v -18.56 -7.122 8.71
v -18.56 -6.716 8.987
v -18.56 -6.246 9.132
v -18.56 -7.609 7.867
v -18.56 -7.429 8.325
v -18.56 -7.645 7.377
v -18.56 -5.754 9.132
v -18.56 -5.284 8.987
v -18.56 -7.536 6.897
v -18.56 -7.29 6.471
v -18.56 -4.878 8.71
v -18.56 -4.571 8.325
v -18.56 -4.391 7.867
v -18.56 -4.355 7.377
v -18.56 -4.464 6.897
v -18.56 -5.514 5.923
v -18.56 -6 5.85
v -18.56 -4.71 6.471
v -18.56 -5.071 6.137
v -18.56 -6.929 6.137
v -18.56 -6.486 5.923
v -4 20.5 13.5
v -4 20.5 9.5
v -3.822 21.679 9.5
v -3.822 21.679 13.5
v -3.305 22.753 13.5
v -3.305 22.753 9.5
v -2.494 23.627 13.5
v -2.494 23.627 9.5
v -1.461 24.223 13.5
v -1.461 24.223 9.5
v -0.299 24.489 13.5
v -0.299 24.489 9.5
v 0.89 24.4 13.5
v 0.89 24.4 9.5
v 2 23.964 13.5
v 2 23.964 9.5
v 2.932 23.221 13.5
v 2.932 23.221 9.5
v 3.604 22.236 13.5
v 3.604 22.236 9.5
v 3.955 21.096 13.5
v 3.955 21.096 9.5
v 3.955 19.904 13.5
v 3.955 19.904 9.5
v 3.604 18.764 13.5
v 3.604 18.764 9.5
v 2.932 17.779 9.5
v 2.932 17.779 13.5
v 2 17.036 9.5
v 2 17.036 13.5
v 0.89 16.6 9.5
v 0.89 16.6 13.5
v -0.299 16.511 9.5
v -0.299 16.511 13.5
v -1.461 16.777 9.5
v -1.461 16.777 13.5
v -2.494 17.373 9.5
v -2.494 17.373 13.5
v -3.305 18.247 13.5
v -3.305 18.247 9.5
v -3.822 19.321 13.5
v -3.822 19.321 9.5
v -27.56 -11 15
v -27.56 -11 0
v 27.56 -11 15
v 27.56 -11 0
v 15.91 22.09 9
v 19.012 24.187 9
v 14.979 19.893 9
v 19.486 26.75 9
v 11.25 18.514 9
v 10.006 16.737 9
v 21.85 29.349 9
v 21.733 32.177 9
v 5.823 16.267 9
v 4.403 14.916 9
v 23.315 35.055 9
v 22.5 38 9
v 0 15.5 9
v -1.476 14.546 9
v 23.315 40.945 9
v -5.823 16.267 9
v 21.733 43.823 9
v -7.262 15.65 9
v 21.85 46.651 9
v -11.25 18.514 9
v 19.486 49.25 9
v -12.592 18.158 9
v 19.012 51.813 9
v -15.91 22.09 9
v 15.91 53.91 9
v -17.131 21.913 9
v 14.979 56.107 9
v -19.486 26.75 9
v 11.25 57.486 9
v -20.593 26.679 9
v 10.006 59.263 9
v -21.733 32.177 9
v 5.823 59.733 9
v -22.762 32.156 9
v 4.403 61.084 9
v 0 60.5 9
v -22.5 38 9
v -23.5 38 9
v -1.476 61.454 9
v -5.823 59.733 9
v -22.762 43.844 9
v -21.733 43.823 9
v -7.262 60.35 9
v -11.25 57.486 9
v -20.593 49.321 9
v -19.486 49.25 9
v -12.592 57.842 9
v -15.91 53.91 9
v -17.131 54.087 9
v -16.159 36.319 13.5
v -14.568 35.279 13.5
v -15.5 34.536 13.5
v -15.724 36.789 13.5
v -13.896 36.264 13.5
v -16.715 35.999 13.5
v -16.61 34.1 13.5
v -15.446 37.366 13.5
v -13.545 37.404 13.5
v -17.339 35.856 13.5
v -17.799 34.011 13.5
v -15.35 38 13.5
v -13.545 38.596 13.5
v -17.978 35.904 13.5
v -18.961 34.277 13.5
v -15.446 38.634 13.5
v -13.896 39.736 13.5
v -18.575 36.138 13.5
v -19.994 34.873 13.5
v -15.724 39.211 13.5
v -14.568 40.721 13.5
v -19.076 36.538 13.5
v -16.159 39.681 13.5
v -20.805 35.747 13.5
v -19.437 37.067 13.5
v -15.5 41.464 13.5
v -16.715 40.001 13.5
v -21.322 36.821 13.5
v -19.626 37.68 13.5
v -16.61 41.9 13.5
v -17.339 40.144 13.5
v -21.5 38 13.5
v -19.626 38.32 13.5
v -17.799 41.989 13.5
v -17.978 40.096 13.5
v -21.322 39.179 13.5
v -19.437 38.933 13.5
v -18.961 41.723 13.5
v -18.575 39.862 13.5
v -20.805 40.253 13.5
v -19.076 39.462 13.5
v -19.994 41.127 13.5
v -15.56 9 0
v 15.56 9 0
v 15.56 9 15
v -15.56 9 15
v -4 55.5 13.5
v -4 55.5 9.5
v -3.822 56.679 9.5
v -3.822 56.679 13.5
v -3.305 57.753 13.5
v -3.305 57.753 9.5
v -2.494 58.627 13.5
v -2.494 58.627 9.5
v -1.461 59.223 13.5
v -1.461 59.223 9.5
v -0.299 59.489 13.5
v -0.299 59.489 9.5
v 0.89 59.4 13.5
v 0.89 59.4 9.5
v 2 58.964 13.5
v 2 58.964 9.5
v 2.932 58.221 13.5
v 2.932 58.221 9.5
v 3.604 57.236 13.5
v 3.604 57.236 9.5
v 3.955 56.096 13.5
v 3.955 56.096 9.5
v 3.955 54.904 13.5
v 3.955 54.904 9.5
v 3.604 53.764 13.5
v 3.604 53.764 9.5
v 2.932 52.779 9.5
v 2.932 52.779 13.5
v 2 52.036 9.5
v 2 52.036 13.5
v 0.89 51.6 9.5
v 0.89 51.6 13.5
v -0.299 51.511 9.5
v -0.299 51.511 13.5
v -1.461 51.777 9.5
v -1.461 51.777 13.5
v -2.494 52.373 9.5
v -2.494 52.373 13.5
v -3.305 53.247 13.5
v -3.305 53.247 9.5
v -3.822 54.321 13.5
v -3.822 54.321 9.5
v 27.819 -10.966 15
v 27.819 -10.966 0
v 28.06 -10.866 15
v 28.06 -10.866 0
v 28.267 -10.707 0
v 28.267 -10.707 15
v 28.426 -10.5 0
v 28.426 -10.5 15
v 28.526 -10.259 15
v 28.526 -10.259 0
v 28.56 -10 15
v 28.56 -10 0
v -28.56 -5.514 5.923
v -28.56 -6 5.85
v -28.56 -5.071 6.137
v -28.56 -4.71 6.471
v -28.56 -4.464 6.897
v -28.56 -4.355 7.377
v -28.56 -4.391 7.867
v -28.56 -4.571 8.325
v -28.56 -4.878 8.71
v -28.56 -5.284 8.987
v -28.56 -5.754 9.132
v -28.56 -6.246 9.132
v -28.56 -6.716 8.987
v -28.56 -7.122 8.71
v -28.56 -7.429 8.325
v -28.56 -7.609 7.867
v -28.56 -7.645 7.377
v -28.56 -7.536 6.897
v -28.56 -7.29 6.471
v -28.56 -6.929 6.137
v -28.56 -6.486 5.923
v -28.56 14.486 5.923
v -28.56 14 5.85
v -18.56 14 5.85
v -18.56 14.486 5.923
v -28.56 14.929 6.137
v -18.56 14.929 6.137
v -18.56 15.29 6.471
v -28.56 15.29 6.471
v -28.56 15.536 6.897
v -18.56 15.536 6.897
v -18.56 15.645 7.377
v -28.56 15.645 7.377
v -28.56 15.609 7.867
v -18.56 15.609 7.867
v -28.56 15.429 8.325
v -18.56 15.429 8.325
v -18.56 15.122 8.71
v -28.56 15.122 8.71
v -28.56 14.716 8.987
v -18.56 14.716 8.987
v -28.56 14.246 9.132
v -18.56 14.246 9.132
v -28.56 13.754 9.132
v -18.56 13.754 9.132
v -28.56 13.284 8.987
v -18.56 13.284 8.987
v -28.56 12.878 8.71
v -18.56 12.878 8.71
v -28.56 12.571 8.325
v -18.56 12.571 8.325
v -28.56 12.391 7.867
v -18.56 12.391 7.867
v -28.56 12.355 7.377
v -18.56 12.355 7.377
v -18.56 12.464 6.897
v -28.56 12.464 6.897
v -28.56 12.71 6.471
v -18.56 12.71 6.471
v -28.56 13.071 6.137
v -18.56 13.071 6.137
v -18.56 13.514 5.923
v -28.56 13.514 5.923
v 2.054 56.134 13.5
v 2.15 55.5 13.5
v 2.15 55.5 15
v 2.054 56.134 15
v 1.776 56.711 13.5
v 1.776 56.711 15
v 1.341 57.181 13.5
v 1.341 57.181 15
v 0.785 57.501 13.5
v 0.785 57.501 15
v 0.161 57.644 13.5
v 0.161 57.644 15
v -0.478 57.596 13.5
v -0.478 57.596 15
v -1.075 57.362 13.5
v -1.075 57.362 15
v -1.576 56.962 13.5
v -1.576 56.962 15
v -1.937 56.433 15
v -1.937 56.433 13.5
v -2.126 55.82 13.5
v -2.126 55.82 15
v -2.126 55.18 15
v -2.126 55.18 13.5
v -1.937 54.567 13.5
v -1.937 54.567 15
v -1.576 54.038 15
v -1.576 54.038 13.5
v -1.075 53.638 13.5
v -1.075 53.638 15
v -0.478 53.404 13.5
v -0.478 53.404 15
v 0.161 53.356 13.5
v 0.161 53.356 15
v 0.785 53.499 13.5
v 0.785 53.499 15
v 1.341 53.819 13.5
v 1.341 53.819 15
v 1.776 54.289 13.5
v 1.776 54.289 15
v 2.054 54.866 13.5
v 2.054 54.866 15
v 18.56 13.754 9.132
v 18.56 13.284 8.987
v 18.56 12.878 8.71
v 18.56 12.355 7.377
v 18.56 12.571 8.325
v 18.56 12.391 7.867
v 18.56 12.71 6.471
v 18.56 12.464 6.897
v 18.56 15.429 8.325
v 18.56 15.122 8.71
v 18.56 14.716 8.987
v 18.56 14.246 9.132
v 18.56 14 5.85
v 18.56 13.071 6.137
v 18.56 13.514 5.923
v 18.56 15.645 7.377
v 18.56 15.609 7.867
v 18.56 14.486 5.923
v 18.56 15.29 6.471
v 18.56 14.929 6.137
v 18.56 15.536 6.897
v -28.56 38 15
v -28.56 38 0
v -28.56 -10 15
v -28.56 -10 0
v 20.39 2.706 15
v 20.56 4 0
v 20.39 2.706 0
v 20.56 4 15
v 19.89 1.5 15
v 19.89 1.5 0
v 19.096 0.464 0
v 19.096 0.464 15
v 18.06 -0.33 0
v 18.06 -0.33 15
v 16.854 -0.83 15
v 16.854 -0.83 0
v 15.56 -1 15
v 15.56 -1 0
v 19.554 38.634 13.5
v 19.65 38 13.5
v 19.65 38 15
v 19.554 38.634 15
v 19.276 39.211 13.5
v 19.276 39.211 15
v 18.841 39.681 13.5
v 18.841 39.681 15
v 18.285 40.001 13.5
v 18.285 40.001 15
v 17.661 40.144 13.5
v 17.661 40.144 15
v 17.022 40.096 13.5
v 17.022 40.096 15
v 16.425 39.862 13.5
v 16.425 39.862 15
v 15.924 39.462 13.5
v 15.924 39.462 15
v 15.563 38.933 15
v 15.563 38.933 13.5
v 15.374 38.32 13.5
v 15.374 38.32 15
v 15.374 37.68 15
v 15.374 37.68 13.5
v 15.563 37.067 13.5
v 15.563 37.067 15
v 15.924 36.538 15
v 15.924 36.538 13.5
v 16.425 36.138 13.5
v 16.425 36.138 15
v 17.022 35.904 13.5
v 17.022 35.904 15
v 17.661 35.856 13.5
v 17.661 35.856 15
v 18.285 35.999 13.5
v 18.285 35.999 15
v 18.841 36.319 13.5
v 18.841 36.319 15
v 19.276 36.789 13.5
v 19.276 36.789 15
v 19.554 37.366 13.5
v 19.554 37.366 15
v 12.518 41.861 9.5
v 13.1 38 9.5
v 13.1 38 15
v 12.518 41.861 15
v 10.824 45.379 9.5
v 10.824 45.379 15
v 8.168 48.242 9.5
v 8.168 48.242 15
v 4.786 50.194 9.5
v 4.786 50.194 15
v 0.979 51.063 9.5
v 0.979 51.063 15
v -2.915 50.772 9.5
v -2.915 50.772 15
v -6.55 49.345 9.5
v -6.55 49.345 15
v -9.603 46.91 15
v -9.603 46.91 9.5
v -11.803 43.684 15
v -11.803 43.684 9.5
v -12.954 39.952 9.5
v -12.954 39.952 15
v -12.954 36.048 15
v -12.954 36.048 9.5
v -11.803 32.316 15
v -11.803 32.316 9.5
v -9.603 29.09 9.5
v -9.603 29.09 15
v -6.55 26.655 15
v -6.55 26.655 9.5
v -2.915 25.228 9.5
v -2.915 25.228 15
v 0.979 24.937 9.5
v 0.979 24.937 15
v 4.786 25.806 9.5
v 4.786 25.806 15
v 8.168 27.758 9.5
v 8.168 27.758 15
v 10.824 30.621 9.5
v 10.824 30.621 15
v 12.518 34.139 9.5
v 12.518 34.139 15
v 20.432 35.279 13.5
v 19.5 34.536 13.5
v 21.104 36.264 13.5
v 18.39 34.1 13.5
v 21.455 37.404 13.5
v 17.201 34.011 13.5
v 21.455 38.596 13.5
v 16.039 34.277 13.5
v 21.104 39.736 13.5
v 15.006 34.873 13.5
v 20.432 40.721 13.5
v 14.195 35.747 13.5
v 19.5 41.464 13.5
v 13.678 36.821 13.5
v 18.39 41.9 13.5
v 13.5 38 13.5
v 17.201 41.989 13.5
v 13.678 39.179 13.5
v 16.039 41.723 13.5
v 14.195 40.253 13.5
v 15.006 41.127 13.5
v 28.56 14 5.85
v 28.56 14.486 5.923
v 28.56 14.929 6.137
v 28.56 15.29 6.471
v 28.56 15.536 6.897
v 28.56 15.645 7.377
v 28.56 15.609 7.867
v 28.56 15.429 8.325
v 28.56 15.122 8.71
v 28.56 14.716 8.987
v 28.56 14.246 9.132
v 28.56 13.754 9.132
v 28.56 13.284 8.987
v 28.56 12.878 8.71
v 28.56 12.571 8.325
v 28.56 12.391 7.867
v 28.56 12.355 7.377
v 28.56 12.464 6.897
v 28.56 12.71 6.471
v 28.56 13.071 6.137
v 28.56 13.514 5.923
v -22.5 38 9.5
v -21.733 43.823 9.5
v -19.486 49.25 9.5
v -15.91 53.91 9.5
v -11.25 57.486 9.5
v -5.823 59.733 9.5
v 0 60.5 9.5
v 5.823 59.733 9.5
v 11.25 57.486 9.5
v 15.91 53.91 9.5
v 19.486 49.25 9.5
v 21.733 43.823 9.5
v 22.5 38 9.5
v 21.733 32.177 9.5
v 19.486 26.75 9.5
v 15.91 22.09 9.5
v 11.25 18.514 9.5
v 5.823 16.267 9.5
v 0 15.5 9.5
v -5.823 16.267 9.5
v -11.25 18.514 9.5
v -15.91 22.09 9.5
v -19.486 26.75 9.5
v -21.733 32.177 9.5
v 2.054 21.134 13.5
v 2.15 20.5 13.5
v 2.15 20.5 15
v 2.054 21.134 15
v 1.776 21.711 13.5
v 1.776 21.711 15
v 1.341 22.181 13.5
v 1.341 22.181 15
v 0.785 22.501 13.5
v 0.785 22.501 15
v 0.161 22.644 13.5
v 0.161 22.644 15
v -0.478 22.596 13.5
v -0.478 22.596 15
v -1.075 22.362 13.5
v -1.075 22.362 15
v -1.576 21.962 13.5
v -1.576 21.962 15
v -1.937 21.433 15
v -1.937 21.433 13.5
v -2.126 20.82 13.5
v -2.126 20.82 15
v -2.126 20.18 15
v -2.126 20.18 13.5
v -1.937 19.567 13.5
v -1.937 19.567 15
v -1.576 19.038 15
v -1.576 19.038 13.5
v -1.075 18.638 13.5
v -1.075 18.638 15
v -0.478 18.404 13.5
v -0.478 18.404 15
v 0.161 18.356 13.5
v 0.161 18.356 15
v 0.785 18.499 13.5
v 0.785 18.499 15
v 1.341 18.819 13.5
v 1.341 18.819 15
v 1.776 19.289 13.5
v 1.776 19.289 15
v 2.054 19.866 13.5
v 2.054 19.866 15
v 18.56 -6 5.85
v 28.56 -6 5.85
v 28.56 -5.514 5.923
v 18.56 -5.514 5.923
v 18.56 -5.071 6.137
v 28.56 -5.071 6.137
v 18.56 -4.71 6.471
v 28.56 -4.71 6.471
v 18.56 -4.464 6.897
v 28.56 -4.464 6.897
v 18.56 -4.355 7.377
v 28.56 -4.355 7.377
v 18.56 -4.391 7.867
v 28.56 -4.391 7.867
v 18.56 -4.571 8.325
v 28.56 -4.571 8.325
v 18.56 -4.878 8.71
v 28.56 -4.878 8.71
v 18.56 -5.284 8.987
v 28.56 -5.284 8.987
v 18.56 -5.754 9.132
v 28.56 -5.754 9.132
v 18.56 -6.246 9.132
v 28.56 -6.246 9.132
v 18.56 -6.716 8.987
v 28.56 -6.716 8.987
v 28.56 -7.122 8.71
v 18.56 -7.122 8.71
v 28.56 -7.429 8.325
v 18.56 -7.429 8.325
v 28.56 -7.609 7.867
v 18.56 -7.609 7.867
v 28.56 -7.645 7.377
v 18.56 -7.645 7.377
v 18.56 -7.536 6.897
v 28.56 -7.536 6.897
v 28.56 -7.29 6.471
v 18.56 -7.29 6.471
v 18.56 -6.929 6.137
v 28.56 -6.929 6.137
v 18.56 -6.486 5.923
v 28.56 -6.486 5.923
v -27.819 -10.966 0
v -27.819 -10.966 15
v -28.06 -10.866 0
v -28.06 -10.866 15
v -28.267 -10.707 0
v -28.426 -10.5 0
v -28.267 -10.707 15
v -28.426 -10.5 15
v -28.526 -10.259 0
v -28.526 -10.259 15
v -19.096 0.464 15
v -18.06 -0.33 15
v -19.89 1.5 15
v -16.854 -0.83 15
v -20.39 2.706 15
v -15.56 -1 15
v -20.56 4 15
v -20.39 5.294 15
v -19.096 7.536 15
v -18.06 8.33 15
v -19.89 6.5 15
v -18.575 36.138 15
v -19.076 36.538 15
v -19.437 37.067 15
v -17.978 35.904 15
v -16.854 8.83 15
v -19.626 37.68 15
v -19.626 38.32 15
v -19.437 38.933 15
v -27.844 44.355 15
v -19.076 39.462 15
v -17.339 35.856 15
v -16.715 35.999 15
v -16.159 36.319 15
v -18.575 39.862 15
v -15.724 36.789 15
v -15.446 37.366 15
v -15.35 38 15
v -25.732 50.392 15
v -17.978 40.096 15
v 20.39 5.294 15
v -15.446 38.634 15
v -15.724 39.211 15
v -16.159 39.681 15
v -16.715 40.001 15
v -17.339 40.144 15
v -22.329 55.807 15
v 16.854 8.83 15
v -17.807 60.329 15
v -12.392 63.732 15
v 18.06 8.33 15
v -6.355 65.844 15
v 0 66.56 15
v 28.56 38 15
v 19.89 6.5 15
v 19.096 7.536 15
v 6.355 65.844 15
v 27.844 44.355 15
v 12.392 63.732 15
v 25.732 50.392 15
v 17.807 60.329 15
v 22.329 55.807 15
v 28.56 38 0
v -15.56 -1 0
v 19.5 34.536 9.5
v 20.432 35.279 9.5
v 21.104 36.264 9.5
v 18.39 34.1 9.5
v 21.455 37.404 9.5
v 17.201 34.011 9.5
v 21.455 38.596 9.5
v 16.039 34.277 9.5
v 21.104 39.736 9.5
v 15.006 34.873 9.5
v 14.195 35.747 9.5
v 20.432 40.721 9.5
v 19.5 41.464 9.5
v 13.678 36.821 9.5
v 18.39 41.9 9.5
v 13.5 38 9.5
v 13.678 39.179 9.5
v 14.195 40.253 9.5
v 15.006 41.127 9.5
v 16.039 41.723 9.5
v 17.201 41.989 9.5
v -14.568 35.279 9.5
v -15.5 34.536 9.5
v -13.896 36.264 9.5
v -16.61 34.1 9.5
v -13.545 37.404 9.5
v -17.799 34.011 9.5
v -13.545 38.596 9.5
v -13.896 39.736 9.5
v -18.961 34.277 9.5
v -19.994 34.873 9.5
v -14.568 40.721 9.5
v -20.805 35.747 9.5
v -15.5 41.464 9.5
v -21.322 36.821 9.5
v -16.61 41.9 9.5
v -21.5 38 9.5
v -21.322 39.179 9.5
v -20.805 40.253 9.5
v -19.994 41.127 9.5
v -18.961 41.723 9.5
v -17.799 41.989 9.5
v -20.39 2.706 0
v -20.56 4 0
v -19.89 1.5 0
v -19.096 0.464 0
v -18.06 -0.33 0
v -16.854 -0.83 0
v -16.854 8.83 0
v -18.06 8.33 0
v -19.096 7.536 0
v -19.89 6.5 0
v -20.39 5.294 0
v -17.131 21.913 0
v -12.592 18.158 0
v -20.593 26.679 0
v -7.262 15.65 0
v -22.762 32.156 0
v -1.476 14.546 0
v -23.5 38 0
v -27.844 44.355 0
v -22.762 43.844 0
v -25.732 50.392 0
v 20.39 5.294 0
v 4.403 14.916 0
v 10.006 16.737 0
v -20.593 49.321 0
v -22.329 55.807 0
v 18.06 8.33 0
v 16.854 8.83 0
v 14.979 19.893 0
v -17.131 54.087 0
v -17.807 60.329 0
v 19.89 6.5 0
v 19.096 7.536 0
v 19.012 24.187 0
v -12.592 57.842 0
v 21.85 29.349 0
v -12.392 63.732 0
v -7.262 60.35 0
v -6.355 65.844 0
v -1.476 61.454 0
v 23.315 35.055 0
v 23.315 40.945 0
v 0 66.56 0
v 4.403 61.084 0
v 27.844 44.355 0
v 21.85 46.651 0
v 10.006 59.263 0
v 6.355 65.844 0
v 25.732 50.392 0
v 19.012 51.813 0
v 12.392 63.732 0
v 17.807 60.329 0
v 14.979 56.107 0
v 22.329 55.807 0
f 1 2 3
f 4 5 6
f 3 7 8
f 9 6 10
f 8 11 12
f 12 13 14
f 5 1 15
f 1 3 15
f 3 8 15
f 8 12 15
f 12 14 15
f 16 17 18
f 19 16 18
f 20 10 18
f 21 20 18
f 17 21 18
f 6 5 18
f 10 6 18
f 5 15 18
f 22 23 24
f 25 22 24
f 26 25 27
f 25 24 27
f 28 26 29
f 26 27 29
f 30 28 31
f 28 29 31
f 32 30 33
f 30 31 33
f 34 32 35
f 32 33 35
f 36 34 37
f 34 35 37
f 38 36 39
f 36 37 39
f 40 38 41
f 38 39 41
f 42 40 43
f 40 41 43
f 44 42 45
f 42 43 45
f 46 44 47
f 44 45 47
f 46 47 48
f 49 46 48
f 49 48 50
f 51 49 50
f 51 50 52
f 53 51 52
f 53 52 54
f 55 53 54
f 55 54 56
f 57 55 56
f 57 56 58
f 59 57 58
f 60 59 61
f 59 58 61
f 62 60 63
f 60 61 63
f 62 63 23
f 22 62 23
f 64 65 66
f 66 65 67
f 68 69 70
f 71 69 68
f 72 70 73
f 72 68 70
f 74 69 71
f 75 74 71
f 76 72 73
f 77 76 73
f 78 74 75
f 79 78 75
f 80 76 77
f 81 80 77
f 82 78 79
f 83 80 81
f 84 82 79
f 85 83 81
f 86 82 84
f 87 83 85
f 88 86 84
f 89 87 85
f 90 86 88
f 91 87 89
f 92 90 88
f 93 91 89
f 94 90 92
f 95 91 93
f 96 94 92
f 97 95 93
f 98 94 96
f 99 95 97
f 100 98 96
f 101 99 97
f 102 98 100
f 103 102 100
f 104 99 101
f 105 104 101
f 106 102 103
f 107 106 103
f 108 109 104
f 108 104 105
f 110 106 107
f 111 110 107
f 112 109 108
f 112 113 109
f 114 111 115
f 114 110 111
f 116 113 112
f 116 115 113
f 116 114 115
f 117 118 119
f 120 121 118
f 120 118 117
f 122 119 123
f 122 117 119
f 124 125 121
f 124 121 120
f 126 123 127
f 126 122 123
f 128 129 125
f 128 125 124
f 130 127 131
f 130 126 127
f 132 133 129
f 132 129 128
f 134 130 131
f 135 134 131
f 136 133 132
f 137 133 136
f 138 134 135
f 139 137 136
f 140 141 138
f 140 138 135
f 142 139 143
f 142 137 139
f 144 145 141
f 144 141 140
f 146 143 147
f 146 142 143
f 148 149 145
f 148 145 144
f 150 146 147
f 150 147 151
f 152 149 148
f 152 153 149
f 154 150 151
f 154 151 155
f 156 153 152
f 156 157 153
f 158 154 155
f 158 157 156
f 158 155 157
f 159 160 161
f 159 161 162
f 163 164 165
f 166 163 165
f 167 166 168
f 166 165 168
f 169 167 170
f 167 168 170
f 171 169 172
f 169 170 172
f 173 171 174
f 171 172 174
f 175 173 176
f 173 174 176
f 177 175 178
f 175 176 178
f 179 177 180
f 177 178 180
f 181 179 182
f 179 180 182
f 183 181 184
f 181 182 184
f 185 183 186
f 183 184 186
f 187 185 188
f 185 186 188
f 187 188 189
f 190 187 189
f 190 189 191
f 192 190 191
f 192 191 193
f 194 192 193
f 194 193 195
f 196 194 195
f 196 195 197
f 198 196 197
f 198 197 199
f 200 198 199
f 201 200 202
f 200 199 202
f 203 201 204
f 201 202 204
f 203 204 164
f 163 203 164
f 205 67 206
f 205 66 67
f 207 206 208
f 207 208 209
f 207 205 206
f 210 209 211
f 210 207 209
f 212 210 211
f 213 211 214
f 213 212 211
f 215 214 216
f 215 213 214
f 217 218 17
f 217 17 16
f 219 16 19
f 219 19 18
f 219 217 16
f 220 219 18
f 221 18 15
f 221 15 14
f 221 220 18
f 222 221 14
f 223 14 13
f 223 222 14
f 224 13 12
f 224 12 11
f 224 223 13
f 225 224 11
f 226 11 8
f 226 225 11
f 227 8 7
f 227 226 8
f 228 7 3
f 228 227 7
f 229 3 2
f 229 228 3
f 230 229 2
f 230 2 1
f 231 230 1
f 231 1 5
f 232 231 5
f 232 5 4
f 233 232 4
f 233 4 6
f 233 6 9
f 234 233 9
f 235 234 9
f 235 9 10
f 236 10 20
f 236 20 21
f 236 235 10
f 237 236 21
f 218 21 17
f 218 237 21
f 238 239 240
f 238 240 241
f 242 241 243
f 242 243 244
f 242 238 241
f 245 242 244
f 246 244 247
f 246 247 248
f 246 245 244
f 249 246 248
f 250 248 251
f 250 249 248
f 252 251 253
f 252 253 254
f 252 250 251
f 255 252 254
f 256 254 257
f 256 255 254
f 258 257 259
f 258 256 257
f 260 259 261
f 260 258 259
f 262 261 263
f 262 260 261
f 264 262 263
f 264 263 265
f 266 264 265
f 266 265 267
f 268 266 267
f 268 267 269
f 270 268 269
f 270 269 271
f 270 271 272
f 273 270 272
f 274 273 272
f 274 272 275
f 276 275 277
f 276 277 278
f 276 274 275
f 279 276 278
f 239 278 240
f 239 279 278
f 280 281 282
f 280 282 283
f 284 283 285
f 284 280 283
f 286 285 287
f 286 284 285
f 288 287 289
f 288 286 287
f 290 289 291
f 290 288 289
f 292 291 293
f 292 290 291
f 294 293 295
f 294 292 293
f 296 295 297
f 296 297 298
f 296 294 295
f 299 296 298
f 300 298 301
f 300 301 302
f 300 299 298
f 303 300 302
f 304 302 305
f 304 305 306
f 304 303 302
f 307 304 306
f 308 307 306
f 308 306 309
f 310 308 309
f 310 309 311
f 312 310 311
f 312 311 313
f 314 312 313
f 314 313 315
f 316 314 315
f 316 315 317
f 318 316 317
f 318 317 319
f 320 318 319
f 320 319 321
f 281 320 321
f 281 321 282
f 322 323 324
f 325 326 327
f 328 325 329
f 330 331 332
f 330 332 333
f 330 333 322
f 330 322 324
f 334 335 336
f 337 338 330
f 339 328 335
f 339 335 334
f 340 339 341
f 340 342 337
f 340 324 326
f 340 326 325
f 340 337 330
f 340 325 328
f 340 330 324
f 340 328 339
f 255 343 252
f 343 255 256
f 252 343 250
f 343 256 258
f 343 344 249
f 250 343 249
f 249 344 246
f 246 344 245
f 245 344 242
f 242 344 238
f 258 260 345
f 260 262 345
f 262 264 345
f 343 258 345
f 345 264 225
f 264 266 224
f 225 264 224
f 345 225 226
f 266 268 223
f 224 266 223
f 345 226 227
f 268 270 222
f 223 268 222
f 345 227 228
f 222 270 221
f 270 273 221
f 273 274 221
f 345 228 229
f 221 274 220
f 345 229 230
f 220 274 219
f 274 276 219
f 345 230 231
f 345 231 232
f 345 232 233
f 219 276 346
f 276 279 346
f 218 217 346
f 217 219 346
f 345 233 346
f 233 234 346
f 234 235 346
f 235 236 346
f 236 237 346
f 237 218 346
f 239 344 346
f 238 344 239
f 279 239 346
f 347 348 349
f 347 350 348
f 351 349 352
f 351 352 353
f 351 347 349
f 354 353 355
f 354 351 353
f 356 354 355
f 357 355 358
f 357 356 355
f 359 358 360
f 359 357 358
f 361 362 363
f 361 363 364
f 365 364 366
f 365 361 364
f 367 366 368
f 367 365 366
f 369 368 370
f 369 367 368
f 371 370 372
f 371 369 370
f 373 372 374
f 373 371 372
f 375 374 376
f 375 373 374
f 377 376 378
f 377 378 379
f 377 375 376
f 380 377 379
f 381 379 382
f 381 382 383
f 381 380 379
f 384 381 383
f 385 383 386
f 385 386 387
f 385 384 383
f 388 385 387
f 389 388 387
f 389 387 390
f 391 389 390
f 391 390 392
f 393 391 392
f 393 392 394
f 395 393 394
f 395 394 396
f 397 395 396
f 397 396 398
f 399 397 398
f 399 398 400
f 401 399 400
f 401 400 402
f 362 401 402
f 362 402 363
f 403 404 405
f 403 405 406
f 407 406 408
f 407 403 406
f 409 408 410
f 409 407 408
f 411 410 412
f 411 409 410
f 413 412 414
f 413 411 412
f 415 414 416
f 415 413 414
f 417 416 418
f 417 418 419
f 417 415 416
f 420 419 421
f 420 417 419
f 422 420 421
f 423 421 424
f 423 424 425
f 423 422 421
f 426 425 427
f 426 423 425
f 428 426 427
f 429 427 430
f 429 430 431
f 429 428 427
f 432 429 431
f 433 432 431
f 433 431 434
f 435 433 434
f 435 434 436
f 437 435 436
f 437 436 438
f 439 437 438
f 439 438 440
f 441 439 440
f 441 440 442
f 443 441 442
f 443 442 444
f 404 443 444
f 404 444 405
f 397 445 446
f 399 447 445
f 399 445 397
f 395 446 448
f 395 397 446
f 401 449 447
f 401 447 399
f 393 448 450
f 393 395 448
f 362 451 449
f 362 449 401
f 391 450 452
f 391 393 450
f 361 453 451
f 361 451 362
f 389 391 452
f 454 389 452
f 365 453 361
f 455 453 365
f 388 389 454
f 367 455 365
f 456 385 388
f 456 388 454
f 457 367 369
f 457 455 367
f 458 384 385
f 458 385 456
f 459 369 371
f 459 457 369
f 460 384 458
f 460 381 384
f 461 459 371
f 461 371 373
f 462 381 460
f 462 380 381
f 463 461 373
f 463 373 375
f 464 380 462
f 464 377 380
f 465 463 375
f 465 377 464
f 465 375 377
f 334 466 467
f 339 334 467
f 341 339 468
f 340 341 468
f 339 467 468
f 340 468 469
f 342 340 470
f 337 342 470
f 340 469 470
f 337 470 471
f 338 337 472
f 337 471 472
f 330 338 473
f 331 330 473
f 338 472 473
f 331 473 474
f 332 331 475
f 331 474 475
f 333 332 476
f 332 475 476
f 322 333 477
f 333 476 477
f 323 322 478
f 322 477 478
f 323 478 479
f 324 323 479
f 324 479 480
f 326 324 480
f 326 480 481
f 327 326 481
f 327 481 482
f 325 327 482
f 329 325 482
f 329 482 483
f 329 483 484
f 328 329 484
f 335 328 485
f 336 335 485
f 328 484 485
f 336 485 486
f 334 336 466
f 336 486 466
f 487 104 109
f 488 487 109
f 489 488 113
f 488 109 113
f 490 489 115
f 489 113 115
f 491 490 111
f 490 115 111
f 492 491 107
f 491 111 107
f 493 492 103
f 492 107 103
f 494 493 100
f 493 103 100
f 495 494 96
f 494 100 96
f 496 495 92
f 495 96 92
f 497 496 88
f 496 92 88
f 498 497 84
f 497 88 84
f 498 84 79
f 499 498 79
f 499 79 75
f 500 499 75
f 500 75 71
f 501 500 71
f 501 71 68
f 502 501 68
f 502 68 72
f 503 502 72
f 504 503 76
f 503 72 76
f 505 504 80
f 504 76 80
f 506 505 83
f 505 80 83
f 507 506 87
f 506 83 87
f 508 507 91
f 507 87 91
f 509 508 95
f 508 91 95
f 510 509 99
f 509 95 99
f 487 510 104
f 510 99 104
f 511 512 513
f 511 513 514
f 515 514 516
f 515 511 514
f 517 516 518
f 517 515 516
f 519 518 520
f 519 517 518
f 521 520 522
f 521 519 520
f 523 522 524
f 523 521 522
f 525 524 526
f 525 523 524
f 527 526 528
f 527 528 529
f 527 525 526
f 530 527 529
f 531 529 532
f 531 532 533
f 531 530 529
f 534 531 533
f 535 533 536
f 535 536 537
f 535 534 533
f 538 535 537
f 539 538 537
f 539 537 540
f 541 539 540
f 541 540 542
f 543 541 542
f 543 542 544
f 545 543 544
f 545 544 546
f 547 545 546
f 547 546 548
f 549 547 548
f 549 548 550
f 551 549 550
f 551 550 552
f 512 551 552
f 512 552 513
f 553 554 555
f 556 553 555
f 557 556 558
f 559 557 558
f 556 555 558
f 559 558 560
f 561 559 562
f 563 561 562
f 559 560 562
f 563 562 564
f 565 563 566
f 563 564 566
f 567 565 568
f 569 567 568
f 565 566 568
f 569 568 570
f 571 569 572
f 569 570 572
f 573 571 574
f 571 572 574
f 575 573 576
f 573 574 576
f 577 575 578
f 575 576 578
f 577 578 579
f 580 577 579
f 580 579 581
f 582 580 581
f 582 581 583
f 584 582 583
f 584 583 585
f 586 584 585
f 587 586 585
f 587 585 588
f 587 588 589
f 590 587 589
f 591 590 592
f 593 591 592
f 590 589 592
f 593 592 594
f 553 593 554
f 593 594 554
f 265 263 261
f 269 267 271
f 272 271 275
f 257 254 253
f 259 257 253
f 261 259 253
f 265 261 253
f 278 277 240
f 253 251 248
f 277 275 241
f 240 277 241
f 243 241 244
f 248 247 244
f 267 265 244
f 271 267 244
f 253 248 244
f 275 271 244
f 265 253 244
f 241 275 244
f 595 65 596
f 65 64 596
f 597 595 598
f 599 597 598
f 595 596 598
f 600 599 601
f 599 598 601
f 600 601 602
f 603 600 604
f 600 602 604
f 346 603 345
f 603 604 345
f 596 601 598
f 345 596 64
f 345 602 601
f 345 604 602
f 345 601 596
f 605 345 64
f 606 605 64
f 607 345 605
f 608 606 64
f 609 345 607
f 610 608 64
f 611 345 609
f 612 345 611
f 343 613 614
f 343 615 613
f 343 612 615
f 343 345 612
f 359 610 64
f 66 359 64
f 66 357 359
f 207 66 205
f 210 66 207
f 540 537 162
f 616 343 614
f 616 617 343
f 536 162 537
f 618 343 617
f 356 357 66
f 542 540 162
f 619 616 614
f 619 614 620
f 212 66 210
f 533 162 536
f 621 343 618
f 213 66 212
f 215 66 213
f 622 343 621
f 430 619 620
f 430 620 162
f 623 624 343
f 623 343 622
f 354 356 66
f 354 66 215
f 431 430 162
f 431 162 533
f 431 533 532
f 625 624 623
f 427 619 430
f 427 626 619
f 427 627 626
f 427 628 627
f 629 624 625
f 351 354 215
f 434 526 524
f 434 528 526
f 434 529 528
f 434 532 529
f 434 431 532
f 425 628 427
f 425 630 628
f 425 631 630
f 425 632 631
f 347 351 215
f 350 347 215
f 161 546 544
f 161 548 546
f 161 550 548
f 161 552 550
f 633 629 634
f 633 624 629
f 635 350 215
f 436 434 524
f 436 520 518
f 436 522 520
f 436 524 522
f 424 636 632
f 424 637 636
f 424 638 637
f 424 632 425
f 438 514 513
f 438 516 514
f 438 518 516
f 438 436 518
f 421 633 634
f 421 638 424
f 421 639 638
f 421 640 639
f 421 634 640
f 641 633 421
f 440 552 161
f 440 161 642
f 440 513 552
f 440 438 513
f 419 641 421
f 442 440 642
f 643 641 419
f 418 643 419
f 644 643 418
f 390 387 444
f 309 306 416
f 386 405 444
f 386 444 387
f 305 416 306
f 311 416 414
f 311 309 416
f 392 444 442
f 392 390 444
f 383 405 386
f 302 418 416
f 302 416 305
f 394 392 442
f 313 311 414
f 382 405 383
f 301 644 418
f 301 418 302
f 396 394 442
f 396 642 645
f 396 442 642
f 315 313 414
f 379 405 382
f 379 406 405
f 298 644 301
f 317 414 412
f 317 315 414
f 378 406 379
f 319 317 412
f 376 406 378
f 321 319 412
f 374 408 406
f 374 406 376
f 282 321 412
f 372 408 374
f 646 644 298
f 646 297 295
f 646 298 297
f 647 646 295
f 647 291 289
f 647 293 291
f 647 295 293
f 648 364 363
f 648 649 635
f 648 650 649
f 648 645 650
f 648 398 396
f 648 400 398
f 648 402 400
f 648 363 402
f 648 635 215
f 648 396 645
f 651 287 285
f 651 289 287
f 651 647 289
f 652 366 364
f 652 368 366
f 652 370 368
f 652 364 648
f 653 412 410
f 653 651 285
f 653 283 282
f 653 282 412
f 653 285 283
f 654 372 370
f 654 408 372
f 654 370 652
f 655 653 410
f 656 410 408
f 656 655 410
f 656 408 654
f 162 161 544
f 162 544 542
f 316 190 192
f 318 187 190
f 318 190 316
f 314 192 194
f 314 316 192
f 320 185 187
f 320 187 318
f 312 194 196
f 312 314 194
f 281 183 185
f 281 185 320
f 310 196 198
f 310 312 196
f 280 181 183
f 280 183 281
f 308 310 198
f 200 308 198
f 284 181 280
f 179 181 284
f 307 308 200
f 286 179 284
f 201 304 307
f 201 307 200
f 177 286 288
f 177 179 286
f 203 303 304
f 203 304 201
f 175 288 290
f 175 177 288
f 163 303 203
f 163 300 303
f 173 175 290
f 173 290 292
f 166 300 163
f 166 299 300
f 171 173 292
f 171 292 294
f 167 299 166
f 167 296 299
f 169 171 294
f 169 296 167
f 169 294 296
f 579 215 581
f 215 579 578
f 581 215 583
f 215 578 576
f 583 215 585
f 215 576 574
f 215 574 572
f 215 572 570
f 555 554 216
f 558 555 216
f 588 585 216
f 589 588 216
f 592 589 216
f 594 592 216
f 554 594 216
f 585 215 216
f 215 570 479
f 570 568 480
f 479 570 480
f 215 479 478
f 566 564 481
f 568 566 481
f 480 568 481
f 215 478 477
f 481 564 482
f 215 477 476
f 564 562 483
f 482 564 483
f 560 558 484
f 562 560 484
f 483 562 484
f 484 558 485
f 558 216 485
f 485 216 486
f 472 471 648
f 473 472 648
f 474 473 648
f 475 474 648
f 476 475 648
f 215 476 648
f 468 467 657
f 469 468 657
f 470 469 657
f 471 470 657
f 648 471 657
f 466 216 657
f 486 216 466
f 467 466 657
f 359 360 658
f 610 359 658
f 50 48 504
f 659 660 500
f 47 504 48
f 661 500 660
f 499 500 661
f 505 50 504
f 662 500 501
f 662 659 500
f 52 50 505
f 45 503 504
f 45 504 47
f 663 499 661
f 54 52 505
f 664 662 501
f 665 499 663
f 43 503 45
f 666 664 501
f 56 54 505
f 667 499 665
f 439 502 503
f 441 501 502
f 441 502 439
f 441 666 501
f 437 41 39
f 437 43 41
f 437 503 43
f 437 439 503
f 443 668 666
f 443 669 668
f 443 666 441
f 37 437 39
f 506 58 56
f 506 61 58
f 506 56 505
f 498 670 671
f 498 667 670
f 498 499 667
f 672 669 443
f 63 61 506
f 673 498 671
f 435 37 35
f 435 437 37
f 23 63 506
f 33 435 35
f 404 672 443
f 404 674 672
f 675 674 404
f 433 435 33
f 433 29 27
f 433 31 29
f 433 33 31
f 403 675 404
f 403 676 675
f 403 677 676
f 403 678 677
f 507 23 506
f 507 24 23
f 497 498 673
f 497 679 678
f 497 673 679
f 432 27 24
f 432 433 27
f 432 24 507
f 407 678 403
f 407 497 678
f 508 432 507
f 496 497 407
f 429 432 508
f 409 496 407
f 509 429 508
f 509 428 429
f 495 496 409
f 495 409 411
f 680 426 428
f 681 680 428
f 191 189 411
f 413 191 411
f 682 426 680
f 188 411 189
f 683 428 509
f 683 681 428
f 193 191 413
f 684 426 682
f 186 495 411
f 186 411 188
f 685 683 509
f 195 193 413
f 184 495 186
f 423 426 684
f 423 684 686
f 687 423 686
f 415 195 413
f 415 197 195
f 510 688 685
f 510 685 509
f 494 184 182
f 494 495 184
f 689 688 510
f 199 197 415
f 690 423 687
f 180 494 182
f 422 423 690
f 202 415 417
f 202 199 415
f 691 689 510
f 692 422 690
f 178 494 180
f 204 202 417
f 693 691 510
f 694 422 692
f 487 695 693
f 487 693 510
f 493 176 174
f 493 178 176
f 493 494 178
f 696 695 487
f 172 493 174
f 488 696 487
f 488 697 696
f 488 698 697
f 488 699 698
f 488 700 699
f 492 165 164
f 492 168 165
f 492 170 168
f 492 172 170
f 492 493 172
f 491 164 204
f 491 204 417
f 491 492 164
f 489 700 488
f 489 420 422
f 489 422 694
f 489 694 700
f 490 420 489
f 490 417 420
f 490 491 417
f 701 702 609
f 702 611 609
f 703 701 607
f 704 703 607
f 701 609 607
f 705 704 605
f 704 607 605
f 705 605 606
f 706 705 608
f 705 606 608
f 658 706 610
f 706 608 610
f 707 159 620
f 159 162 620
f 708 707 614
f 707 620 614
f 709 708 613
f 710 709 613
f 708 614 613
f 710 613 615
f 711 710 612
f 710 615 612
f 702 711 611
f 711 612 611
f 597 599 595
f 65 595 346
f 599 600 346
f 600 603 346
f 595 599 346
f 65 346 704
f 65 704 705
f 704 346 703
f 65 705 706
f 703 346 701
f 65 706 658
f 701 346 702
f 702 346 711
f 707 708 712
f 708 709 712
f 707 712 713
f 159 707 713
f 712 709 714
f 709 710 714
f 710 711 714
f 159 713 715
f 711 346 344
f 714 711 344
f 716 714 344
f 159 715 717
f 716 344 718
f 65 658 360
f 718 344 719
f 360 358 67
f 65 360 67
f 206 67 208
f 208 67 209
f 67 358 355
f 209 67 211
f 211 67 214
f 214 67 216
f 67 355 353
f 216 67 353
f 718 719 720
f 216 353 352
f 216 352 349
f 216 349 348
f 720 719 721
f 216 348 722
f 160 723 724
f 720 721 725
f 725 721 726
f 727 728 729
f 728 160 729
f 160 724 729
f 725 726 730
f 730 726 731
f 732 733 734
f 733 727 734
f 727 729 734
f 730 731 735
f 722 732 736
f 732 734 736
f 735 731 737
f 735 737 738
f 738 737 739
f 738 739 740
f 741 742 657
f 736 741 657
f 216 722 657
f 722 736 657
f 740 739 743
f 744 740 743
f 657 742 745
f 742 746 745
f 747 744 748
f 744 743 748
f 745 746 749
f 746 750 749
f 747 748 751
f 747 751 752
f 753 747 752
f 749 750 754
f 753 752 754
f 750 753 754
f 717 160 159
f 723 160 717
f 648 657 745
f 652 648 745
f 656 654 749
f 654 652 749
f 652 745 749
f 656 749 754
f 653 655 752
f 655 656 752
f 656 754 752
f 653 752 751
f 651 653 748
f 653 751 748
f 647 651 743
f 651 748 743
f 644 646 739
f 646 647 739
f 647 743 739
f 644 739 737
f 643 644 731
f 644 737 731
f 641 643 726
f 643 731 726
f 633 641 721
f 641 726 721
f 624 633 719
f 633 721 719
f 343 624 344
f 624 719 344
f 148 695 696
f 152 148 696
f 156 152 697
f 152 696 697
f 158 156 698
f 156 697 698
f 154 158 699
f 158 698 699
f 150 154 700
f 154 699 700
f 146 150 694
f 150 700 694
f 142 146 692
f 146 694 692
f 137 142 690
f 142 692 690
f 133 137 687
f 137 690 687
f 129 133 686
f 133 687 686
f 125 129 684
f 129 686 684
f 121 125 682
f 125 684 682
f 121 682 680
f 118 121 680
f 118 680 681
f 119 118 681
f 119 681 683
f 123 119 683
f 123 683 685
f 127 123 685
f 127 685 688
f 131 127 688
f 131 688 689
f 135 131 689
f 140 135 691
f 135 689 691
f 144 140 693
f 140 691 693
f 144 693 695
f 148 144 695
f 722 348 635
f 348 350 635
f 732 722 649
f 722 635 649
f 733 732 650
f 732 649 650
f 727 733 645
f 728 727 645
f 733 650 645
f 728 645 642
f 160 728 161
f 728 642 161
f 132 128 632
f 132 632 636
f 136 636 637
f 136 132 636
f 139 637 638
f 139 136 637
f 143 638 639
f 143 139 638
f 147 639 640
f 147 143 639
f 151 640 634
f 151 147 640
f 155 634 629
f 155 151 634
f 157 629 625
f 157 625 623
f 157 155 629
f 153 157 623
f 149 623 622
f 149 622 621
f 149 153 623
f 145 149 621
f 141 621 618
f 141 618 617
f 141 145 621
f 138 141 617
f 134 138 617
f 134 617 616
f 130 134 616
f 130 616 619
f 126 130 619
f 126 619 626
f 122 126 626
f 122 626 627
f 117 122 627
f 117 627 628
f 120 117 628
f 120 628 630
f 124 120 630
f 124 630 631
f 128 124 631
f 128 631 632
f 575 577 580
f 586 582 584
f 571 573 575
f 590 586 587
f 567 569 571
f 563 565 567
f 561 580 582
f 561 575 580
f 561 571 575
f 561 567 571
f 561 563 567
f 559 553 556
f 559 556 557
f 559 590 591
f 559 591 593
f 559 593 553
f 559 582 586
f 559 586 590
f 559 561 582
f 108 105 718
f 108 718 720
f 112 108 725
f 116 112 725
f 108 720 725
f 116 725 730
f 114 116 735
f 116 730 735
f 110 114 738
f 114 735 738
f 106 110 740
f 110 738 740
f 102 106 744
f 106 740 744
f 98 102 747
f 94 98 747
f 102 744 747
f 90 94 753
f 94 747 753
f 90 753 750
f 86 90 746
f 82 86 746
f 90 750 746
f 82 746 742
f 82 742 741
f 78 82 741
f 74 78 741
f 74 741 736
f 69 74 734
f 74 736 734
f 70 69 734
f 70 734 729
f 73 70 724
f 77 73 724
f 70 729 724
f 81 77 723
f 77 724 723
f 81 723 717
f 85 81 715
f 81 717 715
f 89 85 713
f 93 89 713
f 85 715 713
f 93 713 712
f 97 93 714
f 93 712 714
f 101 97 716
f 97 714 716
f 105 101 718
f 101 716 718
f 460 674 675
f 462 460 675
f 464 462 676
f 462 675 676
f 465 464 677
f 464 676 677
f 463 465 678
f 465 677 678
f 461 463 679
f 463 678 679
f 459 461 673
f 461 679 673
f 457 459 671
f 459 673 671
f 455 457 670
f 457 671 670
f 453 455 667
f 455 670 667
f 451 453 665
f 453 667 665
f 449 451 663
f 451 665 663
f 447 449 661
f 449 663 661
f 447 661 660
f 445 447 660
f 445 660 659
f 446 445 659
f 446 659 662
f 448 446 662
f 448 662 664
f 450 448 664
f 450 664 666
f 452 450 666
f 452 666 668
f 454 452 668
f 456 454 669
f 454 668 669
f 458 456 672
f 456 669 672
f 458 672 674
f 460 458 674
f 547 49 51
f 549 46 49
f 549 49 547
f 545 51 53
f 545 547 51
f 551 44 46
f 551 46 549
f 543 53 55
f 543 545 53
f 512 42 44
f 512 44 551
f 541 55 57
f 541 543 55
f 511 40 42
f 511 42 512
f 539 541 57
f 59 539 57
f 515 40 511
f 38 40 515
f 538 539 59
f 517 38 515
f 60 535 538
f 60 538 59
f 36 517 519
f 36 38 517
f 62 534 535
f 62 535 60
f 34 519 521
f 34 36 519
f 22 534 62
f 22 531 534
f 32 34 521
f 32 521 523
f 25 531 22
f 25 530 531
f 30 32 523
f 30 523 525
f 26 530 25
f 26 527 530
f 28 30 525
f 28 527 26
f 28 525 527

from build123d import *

# Parameters (mm, degrees)
SKETCH_1_R           = 13.1
SKETCH_1_R_2         = 2.15
EXTRUDE_1_DEPTH      = 15
SKETCH_2_R           = 1.65
CUT_EXTRUDE_2_DEPTH  = 10
FILLET_3_R           = 1
SKETCH_7_R           = 23.5
CUT_EXTRUDE_7_DEPTH  = 9
SKETCH_9_R           = 22.5
CUT_EXTRUDE_9_DEPTH  = 0.5
SKETCH_10_R          = 4
CUT_EXTRUDE_10_DEPTH = 4
CUT_EXTRUDE_11_DEPTH = 80.771072474
SKETCH_12_W          = 41.12
SKETCH_12_H          = 10
CUT_EXTRUDE_12_DEPTH = 74.965581185
FILLET_4_R           = 5


with BuildPart() as part:
    # ｽｹｯﾁ1 → ﾎﾞｽ - 押し出し1 (new body)
    with BuildSketch(Plane.XY):
        with BuildLine():
            Line((-28.56, -11), (28.56, -11))
            Line((28.56, -11), (28.56, 21.386752274))
            ThreePointArc((28.56, 21.386752274), (0, 71.040484258), (-28.56, 21.386752274))
            Line((-28.56, 21.386752274), (-28.56, -11))
        make_face()
        with Locations((0, 38)):
            Circle(SKETCH_1_R, mode=Mode.SUBTRACT)
        with Locations((0, 55.5)):
            Circle(SKETCH_1_R_2, mode=Mode.SUBTRACT)
        with Locations((17.5, 38)):
            Circle(SKETCH_1_R_2, mode=Mode.SUBTRACT)
        with Locations((0, 20.5)):
            Circle(SKETCH_1_R_2, mode=Mode.SUBTRACT)
        with Locations((-17.5, 38)):
            Circle(SKETCH_1_R_2, mode=Mode.SUBTRACT)
    extrude(amount=EXTRUDE_1_DEPTH)

    # ｽｹｯﾁ2 → ｶｯﾄ - 押し出し2 (cut)
    with BuildSketch(Plane(origin=(28.56, 0, 0), x_dir=(0, 0, -1), z_dir=(1, 0, 0))):
        with Locations((-7.5, -6)):
            Circle(SKETCH_2_R)
        with Locations((-7.5, 14)):
            Circle(SKETCH_2_R)
    cut_extrude_2 = extrude(amount=-CUT_EXTRUDE_2_DEPTH, mode=Mode.SUBTRACT)

    # ﾐﾗｰ2: ｶｯﾄ - 押し出し2 across plane
    add(cut_extrude_2.mirror(Plane.ZY), mode=Mode.SUBTRACT)

    # ﾌｨﾚｯﾄ3
    fillet_3_edges = [part.edges().sort_by_distance(p)[0] for p in [
        (28.56, -11, 7.5),
        (-28.56, -11, 7.5),
    ]]
    fillet(fillet_3_edges, radius=FILLET_3_R)

    # ｽｹｯﾁ7 → ｶｯﾄ - 押し出し7 (cut)
    with BuildSketch(Plane(origin=(0, 0, 0), x_dir=(-1, 0, 0), z_dir=(0, 0, -1))):
        with Locations((0, 38)):
            Circle(SKETCH_7_R)
    extrude(amount=-CUT_EXTRUDE_7_DEPTH, mode=Mode.SUBTRACT)

    # ｽｹｯﾁ9 → ｶｯﾄ - 押し出し9 (cut)
    with BuildSketch(Plane(origin=(0, 0, 9), x_dir=(-1, 0, 0), z_dir=(0, 0, -1))):
        with Locations((0, 38)):
            Circle(SKETCH_9_R)
    extrude(amount=-CUT_EXTRUDE_9_DEPTH, mode=Mode.SUBTRACT)

    # ｽｹｯﾁ10 → ｶｯﾄ - 押し出し10 (cut)
    with BuildSketch(Plane(origin=(0, 0, 9.5), x_dir=(-1, 0, 0), z_dir=(0, 0, -1))):
        with Locations((0, 55.5)):
            Circle(SKETCH_10_R)
        with Locations((17.5, 38)):
            Circle(SKETCH_10_R)
        with Locations((-17.5, 38)):
            Circle(SKETCH_10_R)
        with Locations((0, 20.5)):
            Circle(SKETCH_10_R)
    extrude(amount=-CUT_EXTRUDE_10_DEPTH, mode=Mode.SUBTRACT)

    # ｽｹｯﾁ11 → ｶｯﾄ - 押し出し11 (cut, through all)
    with BuildSketch(Plane(origin=(0, 0, 0), x_dir=(-1, 0, 0), z_dir=(0, 0, -1))):
        with BuildLine():
            Line((-28.56, 21.386752274), (-28.56, 38))
            ThreePointArc((-28.56, 38), (0, 66.56), (28.56, 38))
            Line((28.56, 38), (28.56, 21.386752274))
            ThreePointArc((28.56, 21.386752274), (31.900703992, 29.39658877), (33.040484258, 38))
            ThreePointArc((33.040484258, 38), (-8.60341123, 69.900703992), (-28.56, 21.386752274))
        make_face()
    extrude(amount=-CUT_EXTRUDE_11_DEPTH, mode=Mode.SUBTRACT)

    # ｽｹｯﾁ12 → ｶｯﾄ - 押し出し12 (cut, through all)
    with BuildSketch(Plane(origin=(0, 0, 0), x_dir=(-1, 0, 0), z_dir=(0, 0, -1))):
        with Locations((0, 4)):
            Rectangle(SKETCH_12_W, SKETCH_12_H)
    extrude(amount=-CUT_EXTRUDE_12_DEPTH, mode=Mode.SUBTRACT)

    # ﾌｨﾚｯﾄ4
    fillet_4_edges = [part.edges().sort_by_distance(p)[0] for p in [
        (-20.56, 9, 7.5),
        (-20.56, -1, 7.5),
        (20.56, 9, 7.5),
        (20.56, -1, 7.5),
    ]]
    fillet(fillet_4_edges, radius=FILLET_4_R - 0.0001)  # a hair under: the kernel refuses the full size


solid = part.part
